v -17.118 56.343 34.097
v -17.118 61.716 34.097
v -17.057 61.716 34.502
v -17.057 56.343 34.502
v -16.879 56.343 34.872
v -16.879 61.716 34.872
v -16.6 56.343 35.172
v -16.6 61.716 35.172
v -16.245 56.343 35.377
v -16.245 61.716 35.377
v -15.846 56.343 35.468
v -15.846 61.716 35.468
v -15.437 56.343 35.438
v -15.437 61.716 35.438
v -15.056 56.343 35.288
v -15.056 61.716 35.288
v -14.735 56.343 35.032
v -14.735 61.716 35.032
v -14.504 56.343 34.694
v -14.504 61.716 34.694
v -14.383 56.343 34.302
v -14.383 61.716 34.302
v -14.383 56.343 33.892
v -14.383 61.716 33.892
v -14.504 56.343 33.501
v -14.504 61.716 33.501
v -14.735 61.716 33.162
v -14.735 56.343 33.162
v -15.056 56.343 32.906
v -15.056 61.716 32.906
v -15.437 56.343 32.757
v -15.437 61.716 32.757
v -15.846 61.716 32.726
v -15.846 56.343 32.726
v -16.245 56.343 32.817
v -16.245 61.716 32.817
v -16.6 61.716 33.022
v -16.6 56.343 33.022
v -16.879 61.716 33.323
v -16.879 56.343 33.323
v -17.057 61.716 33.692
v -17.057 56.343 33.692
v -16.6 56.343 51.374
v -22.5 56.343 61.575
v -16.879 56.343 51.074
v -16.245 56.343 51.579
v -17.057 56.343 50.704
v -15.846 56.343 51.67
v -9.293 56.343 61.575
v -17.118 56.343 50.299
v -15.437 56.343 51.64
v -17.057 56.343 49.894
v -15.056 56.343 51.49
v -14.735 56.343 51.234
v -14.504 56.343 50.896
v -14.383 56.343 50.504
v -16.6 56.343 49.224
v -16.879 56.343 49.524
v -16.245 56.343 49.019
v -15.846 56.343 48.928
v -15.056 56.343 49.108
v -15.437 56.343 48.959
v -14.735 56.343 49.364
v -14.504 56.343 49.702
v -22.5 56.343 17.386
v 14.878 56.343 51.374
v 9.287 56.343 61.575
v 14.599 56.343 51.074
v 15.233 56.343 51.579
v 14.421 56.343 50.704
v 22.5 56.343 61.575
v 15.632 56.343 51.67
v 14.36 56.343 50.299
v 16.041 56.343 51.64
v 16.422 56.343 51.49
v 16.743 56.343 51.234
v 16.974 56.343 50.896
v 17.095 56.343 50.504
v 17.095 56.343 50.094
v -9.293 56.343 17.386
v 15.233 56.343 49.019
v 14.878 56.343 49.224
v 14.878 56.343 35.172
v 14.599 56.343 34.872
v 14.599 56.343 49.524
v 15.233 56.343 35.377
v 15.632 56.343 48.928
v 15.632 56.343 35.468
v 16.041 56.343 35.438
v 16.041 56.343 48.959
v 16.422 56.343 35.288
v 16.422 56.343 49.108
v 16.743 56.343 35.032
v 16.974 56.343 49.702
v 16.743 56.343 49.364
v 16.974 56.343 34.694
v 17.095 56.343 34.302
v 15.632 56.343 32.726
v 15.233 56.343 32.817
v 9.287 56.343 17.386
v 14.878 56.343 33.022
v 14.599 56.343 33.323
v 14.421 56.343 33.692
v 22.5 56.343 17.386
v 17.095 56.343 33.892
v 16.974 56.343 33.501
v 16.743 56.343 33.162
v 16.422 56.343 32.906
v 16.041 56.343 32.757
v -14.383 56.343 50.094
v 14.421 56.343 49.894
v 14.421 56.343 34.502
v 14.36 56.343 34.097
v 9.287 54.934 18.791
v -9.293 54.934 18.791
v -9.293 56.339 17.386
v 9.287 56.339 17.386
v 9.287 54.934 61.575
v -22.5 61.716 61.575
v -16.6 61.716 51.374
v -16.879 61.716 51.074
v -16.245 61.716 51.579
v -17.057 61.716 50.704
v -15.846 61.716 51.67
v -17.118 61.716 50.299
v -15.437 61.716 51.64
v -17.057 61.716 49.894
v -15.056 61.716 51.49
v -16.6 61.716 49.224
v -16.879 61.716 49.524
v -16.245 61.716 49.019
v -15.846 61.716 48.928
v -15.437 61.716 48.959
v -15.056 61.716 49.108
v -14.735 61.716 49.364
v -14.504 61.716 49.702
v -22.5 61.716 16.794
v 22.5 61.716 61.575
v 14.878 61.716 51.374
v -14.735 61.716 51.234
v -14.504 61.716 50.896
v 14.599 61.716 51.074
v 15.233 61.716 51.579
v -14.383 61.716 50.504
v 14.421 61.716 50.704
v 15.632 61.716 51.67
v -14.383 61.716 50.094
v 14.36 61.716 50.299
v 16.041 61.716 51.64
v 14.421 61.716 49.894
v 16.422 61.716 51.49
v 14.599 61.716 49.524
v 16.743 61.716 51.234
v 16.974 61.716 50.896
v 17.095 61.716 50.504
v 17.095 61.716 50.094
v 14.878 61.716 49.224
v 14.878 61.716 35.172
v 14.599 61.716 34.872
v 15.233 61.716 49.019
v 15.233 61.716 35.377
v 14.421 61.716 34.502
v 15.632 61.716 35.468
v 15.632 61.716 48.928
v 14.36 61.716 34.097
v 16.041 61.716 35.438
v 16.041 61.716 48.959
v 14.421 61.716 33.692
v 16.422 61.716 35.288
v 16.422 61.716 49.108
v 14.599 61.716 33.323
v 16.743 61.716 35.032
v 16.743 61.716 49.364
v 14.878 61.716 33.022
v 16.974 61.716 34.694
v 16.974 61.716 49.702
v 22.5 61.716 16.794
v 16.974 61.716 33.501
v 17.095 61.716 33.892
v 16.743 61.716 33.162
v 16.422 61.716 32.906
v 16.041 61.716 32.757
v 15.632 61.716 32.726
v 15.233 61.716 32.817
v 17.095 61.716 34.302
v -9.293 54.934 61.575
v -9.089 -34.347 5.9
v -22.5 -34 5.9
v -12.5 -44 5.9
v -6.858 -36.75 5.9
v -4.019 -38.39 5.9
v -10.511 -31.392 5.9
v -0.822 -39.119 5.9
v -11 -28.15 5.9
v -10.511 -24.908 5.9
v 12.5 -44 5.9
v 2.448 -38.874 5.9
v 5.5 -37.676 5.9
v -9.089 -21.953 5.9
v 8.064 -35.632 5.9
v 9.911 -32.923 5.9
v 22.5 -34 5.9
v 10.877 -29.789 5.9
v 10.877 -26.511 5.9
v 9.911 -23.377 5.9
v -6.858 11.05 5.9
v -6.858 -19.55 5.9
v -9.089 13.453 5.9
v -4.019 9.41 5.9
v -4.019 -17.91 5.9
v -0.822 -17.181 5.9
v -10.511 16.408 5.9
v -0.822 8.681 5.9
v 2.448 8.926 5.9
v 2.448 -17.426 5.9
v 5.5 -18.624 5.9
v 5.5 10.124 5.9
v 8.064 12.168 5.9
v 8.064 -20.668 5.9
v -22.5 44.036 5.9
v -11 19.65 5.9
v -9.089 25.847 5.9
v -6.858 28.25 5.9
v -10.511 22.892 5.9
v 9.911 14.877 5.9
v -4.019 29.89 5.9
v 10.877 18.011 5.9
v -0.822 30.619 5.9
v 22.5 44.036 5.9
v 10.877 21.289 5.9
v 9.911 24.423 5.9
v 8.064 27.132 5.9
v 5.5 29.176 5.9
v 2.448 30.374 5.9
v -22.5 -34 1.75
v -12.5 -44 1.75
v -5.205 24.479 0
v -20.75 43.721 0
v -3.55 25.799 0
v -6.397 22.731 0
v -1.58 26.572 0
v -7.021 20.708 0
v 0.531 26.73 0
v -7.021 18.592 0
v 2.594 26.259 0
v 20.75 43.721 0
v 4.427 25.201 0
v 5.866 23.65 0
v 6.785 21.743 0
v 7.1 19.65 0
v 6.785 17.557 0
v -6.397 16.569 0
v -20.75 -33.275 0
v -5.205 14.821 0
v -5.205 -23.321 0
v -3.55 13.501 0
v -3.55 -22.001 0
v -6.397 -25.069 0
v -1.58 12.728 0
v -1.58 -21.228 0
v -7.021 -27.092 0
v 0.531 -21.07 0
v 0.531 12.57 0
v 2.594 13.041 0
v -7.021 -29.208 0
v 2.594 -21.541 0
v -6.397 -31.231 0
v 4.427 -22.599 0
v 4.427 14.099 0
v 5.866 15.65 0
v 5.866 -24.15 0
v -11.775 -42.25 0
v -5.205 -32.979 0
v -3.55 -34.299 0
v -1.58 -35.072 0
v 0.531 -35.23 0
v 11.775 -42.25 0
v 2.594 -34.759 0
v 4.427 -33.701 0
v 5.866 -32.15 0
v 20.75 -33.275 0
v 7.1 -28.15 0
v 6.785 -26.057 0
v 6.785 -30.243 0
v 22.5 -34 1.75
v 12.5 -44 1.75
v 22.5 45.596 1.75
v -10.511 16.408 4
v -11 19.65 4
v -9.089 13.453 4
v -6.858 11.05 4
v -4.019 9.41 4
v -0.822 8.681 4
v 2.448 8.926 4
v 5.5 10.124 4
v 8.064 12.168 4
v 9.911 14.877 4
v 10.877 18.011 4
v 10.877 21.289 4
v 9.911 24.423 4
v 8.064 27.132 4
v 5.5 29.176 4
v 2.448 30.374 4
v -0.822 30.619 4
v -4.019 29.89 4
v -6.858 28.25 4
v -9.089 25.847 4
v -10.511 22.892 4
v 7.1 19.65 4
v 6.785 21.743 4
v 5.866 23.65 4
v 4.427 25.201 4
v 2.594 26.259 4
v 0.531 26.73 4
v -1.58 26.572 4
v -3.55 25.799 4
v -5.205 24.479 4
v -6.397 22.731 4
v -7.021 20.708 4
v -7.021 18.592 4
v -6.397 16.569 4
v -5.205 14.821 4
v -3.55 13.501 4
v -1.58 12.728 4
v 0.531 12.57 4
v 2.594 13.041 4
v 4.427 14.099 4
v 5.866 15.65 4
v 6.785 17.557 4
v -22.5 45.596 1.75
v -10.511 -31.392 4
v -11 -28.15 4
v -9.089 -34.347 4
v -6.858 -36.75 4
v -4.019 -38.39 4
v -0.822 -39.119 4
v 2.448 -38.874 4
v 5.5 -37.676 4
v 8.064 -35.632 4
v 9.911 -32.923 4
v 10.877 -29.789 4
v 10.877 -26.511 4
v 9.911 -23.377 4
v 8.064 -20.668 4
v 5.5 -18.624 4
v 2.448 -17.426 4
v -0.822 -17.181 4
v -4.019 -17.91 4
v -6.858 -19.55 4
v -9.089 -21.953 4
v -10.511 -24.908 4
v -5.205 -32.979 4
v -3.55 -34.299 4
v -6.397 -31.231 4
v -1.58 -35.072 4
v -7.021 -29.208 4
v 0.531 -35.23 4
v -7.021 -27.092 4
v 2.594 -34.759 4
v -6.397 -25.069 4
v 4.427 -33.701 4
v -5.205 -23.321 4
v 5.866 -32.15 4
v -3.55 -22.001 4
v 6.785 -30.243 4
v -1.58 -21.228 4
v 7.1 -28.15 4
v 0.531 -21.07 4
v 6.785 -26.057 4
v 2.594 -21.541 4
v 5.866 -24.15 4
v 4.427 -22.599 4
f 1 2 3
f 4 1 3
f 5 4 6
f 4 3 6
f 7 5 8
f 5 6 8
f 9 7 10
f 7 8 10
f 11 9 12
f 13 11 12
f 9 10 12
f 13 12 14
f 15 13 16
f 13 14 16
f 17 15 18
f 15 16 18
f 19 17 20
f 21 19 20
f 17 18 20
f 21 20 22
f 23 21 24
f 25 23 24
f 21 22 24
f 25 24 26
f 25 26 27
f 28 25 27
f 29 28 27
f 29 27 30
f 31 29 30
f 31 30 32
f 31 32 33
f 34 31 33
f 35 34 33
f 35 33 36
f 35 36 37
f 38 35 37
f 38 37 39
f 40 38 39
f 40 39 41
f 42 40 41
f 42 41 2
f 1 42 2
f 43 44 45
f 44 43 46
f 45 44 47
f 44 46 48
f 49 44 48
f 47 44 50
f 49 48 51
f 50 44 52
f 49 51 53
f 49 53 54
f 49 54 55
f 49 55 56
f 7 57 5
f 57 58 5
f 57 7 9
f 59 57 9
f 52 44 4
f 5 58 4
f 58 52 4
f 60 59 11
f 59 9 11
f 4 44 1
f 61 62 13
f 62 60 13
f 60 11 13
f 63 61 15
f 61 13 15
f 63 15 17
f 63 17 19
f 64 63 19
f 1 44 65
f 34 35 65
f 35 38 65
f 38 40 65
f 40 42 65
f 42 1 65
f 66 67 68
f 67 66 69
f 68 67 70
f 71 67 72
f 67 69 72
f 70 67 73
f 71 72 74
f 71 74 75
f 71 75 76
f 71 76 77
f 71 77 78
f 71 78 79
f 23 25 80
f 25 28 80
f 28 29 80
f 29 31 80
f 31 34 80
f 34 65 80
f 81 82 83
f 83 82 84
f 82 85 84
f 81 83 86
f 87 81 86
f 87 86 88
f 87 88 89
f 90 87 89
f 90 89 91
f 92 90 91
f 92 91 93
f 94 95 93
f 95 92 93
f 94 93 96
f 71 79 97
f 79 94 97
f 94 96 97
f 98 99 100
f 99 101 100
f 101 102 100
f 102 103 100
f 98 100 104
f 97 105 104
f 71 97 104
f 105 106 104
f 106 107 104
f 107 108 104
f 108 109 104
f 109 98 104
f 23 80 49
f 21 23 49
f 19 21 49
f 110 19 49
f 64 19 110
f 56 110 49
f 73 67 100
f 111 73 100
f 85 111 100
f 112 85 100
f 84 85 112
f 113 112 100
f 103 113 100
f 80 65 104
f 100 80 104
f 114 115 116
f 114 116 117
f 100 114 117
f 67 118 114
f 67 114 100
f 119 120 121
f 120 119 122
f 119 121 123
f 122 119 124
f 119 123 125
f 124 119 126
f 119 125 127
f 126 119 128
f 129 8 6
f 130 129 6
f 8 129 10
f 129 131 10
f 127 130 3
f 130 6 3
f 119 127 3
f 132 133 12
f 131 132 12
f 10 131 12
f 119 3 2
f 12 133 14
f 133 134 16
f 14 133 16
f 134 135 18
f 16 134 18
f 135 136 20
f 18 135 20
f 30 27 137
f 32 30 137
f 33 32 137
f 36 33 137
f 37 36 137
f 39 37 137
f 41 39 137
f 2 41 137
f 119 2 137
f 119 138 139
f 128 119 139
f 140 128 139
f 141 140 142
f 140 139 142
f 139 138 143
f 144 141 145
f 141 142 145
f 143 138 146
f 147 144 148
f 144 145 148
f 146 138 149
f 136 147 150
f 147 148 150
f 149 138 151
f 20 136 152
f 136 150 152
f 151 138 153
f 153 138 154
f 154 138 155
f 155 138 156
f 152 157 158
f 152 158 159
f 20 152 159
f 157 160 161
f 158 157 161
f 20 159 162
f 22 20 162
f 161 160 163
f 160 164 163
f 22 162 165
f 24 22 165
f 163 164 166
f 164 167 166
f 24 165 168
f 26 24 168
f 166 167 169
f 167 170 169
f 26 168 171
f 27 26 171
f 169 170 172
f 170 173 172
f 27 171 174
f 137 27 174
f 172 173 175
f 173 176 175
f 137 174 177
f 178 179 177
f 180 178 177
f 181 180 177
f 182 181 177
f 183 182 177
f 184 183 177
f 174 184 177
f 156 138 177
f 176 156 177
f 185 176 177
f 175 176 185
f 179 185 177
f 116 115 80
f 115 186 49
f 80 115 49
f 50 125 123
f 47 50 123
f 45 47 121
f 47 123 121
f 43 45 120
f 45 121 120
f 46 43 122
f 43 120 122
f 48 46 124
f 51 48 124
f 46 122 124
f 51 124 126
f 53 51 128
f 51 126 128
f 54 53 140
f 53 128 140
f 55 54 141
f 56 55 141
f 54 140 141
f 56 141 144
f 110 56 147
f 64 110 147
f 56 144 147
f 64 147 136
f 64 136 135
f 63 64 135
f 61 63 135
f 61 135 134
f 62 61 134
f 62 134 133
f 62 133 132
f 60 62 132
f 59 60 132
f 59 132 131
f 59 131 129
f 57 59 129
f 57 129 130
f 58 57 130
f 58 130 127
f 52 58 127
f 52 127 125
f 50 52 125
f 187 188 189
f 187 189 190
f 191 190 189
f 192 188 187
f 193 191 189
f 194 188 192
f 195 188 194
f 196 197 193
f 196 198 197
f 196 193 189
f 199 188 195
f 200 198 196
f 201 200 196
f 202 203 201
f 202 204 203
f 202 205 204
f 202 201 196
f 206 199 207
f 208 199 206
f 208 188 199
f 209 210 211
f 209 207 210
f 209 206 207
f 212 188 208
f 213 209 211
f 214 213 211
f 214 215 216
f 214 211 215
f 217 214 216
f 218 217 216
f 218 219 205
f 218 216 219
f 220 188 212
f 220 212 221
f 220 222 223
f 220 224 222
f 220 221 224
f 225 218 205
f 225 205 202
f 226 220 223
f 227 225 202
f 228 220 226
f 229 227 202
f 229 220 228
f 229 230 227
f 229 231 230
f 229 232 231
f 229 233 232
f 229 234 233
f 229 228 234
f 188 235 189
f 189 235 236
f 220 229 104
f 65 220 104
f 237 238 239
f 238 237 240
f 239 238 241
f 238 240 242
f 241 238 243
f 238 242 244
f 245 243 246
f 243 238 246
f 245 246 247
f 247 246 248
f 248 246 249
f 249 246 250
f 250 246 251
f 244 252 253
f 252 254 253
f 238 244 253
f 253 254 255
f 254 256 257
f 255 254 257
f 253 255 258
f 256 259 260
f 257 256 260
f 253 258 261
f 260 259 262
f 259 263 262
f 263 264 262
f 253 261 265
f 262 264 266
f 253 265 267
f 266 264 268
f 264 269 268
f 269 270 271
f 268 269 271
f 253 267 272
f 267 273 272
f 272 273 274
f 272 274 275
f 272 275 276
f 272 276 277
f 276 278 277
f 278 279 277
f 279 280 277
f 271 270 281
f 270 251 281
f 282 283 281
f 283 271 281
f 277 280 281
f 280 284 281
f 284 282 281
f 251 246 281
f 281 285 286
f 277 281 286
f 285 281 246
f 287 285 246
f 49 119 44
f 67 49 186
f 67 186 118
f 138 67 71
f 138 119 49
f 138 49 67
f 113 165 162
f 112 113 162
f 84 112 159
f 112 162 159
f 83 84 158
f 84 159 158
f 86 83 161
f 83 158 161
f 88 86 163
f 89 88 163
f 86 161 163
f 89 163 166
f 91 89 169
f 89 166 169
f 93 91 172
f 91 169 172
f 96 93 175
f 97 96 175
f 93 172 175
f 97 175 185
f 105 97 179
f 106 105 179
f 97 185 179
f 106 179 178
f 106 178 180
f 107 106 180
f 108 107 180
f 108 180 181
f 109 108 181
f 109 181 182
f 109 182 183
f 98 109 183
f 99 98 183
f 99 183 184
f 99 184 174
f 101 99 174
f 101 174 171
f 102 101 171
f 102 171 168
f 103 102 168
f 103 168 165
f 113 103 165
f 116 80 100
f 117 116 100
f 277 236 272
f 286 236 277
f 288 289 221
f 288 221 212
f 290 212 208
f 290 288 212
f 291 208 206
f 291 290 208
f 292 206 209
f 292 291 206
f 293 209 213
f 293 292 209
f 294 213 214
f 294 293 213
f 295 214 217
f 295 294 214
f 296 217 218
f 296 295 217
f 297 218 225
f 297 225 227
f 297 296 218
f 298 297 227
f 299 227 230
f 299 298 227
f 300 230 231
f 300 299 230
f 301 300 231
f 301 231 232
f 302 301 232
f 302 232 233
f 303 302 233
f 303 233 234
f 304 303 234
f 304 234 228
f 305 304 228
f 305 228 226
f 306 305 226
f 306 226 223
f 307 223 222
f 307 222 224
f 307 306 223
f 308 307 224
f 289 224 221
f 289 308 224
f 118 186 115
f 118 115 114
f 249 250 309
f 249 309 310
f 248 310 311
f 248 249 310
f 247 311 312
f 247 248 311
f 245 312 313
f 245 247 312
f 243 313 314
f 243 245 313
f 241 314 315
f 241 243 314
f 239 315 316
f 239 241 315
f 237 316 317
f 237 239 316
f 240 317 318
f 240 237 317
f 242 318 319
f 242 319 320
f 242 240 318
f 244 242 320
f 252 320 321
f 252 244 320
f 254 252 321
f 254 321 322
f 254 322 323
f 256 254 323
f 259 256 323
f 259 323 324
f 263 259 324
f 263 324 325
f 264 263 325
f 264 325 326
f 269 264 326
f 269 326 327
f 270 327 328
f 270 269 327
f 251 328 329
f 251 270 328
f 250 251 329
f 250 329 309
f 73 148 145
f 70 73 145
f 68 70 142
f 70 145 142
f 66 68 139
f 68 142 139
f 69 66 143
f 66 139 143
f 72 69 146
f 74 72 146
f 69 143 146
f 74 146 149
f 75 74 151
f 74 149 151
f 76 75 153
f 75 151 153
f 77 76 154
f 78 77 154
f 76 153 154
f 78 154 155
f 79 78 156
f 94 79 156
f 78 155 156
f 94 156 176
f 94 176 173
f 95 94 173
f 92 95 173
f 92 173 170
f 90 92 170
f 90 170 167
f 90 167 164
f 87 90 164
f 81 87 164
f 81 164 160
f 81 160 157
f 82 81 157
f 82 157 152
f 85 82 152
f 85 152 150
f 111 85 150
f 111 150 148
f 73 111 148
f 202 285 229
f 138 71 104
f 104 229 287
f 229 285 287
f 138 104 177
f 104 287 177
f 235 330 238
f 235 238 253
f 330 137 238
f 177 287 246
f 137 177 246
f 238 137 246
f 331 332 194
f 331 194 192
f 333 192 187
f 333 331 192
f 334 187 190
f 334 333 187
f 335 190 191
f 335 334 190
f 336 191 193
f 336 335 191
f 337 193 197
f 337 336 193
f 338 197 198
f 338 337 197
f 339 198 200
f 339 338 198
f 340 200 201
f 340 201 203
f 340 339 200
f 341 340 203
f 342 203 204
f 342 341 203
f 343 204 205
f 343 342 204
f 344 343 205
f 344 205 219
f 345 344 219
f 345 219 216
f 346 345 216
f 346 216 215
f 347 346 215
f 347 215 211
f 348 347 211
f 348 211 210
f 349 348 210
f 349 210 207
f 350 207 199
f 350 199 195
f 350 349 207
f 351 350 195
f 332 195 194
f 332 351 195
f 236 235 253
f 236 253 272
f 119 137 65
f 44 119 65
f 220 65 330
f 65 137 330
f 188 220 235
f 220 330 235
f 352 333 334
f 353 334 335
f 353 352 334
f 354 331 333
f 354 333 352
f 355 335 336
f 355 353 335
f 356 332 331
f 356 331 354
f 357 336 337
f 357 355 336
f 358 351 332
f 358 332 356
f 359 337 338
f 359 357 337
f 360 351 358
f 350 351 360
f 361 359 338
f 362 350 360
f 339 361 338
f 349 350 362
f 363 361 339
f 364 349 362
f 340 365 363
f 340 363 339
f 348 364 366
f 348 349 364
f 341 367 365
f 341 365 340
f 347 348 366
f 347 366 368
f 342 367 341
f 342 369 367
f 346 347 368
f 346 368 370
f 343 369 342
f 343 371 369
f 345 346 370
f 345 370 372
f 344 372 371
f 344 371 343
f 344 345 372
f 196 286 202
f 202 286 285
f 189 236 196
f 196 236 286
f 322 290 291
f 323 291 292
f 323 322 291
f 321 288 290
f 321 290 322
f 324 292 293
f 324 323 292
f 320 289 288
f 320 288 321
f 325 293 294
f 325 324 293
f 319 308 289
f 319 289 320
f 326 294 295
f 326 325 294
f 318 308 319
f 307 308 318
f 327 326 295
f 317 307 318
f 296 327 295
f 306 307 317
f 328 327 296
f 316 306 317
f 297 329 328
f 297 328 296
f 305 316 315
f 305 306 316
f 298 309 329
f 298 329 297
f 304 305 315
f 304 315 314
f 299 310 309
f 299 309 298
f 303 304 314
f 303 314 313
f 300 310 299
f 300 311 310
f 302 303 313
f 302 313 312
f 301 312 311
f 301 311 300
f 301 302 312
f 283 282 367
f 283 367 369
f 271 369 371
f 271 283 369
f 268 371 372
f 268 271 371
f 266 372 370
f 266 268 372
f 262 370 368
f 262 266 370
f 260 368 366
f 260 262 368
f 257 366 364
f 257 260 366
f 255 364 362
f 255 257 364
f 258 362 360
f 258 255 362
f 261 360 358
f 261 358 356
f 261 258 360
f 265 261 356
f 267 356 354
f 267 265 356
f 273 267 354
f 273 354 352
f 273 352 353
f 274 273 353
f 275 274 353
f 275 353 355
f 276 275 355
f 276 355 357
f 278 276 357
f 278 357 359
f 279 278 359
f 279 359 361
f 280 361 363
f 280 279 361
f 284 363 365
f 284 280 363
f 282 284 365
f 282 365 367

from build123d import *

# Parameters (mm, degrees)
SKETCH1_W                       = 45
SKETCH1_H                       = 86
SKETCH1_R                       = 7.1
BOSS_EXTRUDE1_DEPTH             = 4
BOSS_EXTRUDE2_DEPTH             = 45
SKETCH3_W                       = 45
SKETCH3_H                       = 5.372111066
BOSS_EXTRUDE3_DEPTH             = 40
BOSS_EXTRUDE3_DIRECTION_2_REACH = 70.185
SKETCH4_W                       = 45
SKETCH4_H                       = 5.372111066
BOSS_EXTRUDE4_DEPTH             = 3.295
SKETCH5_W                       = 18.57978737
SKETCH5_H                       = 1.409707481
BOSS_EXTRUDE5_DEPTH             = 44.189029
CHAMFER2_SIZE                   = 1.405
BOSS_EXTRUDE7_DEPTH             = 45
SKETCH8_R                       = 1.375
CUT_EXTRUDE1_DEPTH              = 125.392527932
CHAMFER3_SIZE                   = 10
CHAMFER4_SIZE                   = 1.75
SKETCH9_R                       = 11
SKETCH9_W                       = 45
SKETCH9_H                       = 4.475285766
BOSS_EXTRUDE8_DEPTH             = 1.9


with BuildPart() as part:
    # Sketch1 → Boss-Extrude1 (new body)
    with BuildSketch(Plane.XY):
        with Locations((0, -1)):
            Rectangle(SKETCH1_W, SKETCH1_H)
        with Locations((0, 19.65)):
            Circle(SKETCH1_R, mode=Mode.SUBTRACT)
        with Locations((0, -28.15)):
            Circle(SKETCH1_R, mode=Mode.SUBTRACT)
    extrude(amount=BOSS_EXTRUDE1_DEPTH)

    # Sketch2 → Boss-Extrude2 (add)
    with BuildSketch(Plane(origin=(22.5, 0, 0), x_dir=(0, 0, -1), z_dir=(1, 0, 0))):
        with BuildLine():
            Line((-4, 42), (-17.385970531, 56.343405204))
            add(Edge.make_bspline(
                [(-18.399488548, 61.71551627), (-17.964102111, 59.93301782), (-17.698797731, 58.135329436), (-17.385970531, 56.343405204)],
                knots=[0.068292811, 0.068292811, 0.068292811, 0.068292811, 0.115576408, 0.115576408, 0.115576408, 0.115576408], degree=3))
            Line((-18.399488548, 61.71551627), (0, 42))
            Line((0, 42), (-4, 42))
        make_face()
    extrude(amount=-BOSS_EXTRUDE2_DEPTH)

    # Sketch3 → Boss-Extrude3 (add)
    with BuildSketch(Plane.XY.offset(18.28)):
        with Locations((0, 59.029460737)):
            Rectangle(SKETCH3_W, SKETCH3_H)
    extrude(amount=BOSS_EXTRUDE3_DEPTH)

    # Sketch3 → Boss-Extrude3 direction 2 (add, up to next)
    with BuildSketch(Plane.XY.offset(18.28), mode=Mode.PRIVATE) as boss_extrude3_direction_2_sk1:
        with Locations((0, 59.029460737)):
            Rectangle(SKETCH3_W, SKETCH3_H)
    boss_extrude3_direction_2_tool1 = extrude(boss_extrude3_direction_2_sk1.sketch, amount=-BOSS_EXTRUDE3_DIRECTION_2_REACH, mode=Mode.PRIVATE) - part.part
    add(boss_extrude3_direction_2_tool1.solids().sort_by_distance((0, 59.029461, 18.28))[0])

    # Sketch4 → Boss-Extrude4 (add)
    with BuildSketch(Plane.XY.offset(58.28)):
        with Locations((0, 59.029460737)):
            Rectangle(SKETCH4_W, SKETCH4_H)
    extrude(amount=BOSS_EXTRUDE4_DEPTH)

    # Sketch5 → Boss-Extrude5 (add)
    with BuildSketch(Plane.XY.offset(61.575)):
        with Locations((-0.00312038, 55.638551464)):
            Rectangle(SKETCH5_W, SKETCH5_H)
    extrude(amount=-BOSS_EXTRUDE5_DEPTH)

    # Chamfer2
    chamfer2_edges = [part.edges().sort_by_distance(p)[0] for p in [
        (-0.00312038, 54.933697723, 17.385971),
    ]]
    chamfer(chamfer2_edges, length=CHAMFER2_SIZE)

    # Sketch7 → Boss-Extrude7 (add)
    with BuildSketch(Plane(origin=(22.5, 0, 0), x_dir=(0, 0, -1), z_dir=(1, 0, 0))):
        Polygon((-18.28, 61.71551627), (-16.793697174, 61.71551627), (0, 43.720645978), (0, 42), (-18.28, 61.587481275), align=None)
    extrude(amount=-BOSS_EXTRUDE7_DEPTH)

    # Sketch8 → Cut-Extrude1 (cut, through all)
    with BuildSketch(Plane(origin=(0, 61.71551627, 0), x_dir=(1, 0, 0), z_dir=(0, 1, 0))):
        with Locations(Location((15.735, -50.299042534, 0), (0, 0, 180))):
            Circle(SKETCH8_R)
        with Locations(Location((15.735, -34.097127603, 0), (0, 0, 180))):
            Circle(SKETCH8_R)
        with Locations(Location((-15.743014065, -34.097127603, 0), (0, 0, 180))):
            Circle(SKETCH8_R)
        with Locations(Location((-15.743014065, -50.299042534, 0), (0, 0, 180))):
            Circle(SKETCH8_R)
    extrude(amount=-CUT_EXTRUDE1_DEPTH, mode=Mode.SUBTRACT)

    # Chamfer3
    chamfer3_edges = [part.edges().sort_by_distance(p)[0] for p in [
        (22.5, -44, 2),
        (-22.5, -44, 2),
    ]]
    chamfer(chamfer3_edges, length=CHAMFER3_SIZE)

    # Chamfer4
    chamfer4_edges = [part.edges().sort_by_distance(p)[0] for p in [
        (22.5, 4.860322989, 0),
        (0, -44, 0),
        (-17.5, -39, 0),
        (17.5, -39, 0),
        (-22.5, 4.860322989, 0),
    ]]
    chamfer(chamfer4_edges, length=CHAMFER4_SIZE)

    # Sketch9 → Boss-Extrude8 (add)
    # profile 1 of 2: a face of its own
    with BuildSketch(Plane.XY.offset(4)):
        Polygon((-22.5, -34), (-12.5, -44), (12.5, -44), (22.5, -34), (22.5, 42), (-22.5, 42), align=None)
        with Locations(Location((0, -28.15, 0), (0, 0, 180))):
            Circle(SKETCH9_R, mode=Mode.SUBTRACT)
        with Locations(Location((0, 19.65, 0), (0, 0, 180))):
            Circle(SKETCH9_R, mode=Mode.SUBTRACT)
    # profile 2 of 2: a face of its own
    with BuildSketch(Plane.XY.offset(4)):
        with Locations((0, 44.237642883)):
            Rectangle(SKETCH9_W, SKETCH9_H)
    extrude(amount=BOSS_EXTRUDE8_DEPTH)


solid = part.part
